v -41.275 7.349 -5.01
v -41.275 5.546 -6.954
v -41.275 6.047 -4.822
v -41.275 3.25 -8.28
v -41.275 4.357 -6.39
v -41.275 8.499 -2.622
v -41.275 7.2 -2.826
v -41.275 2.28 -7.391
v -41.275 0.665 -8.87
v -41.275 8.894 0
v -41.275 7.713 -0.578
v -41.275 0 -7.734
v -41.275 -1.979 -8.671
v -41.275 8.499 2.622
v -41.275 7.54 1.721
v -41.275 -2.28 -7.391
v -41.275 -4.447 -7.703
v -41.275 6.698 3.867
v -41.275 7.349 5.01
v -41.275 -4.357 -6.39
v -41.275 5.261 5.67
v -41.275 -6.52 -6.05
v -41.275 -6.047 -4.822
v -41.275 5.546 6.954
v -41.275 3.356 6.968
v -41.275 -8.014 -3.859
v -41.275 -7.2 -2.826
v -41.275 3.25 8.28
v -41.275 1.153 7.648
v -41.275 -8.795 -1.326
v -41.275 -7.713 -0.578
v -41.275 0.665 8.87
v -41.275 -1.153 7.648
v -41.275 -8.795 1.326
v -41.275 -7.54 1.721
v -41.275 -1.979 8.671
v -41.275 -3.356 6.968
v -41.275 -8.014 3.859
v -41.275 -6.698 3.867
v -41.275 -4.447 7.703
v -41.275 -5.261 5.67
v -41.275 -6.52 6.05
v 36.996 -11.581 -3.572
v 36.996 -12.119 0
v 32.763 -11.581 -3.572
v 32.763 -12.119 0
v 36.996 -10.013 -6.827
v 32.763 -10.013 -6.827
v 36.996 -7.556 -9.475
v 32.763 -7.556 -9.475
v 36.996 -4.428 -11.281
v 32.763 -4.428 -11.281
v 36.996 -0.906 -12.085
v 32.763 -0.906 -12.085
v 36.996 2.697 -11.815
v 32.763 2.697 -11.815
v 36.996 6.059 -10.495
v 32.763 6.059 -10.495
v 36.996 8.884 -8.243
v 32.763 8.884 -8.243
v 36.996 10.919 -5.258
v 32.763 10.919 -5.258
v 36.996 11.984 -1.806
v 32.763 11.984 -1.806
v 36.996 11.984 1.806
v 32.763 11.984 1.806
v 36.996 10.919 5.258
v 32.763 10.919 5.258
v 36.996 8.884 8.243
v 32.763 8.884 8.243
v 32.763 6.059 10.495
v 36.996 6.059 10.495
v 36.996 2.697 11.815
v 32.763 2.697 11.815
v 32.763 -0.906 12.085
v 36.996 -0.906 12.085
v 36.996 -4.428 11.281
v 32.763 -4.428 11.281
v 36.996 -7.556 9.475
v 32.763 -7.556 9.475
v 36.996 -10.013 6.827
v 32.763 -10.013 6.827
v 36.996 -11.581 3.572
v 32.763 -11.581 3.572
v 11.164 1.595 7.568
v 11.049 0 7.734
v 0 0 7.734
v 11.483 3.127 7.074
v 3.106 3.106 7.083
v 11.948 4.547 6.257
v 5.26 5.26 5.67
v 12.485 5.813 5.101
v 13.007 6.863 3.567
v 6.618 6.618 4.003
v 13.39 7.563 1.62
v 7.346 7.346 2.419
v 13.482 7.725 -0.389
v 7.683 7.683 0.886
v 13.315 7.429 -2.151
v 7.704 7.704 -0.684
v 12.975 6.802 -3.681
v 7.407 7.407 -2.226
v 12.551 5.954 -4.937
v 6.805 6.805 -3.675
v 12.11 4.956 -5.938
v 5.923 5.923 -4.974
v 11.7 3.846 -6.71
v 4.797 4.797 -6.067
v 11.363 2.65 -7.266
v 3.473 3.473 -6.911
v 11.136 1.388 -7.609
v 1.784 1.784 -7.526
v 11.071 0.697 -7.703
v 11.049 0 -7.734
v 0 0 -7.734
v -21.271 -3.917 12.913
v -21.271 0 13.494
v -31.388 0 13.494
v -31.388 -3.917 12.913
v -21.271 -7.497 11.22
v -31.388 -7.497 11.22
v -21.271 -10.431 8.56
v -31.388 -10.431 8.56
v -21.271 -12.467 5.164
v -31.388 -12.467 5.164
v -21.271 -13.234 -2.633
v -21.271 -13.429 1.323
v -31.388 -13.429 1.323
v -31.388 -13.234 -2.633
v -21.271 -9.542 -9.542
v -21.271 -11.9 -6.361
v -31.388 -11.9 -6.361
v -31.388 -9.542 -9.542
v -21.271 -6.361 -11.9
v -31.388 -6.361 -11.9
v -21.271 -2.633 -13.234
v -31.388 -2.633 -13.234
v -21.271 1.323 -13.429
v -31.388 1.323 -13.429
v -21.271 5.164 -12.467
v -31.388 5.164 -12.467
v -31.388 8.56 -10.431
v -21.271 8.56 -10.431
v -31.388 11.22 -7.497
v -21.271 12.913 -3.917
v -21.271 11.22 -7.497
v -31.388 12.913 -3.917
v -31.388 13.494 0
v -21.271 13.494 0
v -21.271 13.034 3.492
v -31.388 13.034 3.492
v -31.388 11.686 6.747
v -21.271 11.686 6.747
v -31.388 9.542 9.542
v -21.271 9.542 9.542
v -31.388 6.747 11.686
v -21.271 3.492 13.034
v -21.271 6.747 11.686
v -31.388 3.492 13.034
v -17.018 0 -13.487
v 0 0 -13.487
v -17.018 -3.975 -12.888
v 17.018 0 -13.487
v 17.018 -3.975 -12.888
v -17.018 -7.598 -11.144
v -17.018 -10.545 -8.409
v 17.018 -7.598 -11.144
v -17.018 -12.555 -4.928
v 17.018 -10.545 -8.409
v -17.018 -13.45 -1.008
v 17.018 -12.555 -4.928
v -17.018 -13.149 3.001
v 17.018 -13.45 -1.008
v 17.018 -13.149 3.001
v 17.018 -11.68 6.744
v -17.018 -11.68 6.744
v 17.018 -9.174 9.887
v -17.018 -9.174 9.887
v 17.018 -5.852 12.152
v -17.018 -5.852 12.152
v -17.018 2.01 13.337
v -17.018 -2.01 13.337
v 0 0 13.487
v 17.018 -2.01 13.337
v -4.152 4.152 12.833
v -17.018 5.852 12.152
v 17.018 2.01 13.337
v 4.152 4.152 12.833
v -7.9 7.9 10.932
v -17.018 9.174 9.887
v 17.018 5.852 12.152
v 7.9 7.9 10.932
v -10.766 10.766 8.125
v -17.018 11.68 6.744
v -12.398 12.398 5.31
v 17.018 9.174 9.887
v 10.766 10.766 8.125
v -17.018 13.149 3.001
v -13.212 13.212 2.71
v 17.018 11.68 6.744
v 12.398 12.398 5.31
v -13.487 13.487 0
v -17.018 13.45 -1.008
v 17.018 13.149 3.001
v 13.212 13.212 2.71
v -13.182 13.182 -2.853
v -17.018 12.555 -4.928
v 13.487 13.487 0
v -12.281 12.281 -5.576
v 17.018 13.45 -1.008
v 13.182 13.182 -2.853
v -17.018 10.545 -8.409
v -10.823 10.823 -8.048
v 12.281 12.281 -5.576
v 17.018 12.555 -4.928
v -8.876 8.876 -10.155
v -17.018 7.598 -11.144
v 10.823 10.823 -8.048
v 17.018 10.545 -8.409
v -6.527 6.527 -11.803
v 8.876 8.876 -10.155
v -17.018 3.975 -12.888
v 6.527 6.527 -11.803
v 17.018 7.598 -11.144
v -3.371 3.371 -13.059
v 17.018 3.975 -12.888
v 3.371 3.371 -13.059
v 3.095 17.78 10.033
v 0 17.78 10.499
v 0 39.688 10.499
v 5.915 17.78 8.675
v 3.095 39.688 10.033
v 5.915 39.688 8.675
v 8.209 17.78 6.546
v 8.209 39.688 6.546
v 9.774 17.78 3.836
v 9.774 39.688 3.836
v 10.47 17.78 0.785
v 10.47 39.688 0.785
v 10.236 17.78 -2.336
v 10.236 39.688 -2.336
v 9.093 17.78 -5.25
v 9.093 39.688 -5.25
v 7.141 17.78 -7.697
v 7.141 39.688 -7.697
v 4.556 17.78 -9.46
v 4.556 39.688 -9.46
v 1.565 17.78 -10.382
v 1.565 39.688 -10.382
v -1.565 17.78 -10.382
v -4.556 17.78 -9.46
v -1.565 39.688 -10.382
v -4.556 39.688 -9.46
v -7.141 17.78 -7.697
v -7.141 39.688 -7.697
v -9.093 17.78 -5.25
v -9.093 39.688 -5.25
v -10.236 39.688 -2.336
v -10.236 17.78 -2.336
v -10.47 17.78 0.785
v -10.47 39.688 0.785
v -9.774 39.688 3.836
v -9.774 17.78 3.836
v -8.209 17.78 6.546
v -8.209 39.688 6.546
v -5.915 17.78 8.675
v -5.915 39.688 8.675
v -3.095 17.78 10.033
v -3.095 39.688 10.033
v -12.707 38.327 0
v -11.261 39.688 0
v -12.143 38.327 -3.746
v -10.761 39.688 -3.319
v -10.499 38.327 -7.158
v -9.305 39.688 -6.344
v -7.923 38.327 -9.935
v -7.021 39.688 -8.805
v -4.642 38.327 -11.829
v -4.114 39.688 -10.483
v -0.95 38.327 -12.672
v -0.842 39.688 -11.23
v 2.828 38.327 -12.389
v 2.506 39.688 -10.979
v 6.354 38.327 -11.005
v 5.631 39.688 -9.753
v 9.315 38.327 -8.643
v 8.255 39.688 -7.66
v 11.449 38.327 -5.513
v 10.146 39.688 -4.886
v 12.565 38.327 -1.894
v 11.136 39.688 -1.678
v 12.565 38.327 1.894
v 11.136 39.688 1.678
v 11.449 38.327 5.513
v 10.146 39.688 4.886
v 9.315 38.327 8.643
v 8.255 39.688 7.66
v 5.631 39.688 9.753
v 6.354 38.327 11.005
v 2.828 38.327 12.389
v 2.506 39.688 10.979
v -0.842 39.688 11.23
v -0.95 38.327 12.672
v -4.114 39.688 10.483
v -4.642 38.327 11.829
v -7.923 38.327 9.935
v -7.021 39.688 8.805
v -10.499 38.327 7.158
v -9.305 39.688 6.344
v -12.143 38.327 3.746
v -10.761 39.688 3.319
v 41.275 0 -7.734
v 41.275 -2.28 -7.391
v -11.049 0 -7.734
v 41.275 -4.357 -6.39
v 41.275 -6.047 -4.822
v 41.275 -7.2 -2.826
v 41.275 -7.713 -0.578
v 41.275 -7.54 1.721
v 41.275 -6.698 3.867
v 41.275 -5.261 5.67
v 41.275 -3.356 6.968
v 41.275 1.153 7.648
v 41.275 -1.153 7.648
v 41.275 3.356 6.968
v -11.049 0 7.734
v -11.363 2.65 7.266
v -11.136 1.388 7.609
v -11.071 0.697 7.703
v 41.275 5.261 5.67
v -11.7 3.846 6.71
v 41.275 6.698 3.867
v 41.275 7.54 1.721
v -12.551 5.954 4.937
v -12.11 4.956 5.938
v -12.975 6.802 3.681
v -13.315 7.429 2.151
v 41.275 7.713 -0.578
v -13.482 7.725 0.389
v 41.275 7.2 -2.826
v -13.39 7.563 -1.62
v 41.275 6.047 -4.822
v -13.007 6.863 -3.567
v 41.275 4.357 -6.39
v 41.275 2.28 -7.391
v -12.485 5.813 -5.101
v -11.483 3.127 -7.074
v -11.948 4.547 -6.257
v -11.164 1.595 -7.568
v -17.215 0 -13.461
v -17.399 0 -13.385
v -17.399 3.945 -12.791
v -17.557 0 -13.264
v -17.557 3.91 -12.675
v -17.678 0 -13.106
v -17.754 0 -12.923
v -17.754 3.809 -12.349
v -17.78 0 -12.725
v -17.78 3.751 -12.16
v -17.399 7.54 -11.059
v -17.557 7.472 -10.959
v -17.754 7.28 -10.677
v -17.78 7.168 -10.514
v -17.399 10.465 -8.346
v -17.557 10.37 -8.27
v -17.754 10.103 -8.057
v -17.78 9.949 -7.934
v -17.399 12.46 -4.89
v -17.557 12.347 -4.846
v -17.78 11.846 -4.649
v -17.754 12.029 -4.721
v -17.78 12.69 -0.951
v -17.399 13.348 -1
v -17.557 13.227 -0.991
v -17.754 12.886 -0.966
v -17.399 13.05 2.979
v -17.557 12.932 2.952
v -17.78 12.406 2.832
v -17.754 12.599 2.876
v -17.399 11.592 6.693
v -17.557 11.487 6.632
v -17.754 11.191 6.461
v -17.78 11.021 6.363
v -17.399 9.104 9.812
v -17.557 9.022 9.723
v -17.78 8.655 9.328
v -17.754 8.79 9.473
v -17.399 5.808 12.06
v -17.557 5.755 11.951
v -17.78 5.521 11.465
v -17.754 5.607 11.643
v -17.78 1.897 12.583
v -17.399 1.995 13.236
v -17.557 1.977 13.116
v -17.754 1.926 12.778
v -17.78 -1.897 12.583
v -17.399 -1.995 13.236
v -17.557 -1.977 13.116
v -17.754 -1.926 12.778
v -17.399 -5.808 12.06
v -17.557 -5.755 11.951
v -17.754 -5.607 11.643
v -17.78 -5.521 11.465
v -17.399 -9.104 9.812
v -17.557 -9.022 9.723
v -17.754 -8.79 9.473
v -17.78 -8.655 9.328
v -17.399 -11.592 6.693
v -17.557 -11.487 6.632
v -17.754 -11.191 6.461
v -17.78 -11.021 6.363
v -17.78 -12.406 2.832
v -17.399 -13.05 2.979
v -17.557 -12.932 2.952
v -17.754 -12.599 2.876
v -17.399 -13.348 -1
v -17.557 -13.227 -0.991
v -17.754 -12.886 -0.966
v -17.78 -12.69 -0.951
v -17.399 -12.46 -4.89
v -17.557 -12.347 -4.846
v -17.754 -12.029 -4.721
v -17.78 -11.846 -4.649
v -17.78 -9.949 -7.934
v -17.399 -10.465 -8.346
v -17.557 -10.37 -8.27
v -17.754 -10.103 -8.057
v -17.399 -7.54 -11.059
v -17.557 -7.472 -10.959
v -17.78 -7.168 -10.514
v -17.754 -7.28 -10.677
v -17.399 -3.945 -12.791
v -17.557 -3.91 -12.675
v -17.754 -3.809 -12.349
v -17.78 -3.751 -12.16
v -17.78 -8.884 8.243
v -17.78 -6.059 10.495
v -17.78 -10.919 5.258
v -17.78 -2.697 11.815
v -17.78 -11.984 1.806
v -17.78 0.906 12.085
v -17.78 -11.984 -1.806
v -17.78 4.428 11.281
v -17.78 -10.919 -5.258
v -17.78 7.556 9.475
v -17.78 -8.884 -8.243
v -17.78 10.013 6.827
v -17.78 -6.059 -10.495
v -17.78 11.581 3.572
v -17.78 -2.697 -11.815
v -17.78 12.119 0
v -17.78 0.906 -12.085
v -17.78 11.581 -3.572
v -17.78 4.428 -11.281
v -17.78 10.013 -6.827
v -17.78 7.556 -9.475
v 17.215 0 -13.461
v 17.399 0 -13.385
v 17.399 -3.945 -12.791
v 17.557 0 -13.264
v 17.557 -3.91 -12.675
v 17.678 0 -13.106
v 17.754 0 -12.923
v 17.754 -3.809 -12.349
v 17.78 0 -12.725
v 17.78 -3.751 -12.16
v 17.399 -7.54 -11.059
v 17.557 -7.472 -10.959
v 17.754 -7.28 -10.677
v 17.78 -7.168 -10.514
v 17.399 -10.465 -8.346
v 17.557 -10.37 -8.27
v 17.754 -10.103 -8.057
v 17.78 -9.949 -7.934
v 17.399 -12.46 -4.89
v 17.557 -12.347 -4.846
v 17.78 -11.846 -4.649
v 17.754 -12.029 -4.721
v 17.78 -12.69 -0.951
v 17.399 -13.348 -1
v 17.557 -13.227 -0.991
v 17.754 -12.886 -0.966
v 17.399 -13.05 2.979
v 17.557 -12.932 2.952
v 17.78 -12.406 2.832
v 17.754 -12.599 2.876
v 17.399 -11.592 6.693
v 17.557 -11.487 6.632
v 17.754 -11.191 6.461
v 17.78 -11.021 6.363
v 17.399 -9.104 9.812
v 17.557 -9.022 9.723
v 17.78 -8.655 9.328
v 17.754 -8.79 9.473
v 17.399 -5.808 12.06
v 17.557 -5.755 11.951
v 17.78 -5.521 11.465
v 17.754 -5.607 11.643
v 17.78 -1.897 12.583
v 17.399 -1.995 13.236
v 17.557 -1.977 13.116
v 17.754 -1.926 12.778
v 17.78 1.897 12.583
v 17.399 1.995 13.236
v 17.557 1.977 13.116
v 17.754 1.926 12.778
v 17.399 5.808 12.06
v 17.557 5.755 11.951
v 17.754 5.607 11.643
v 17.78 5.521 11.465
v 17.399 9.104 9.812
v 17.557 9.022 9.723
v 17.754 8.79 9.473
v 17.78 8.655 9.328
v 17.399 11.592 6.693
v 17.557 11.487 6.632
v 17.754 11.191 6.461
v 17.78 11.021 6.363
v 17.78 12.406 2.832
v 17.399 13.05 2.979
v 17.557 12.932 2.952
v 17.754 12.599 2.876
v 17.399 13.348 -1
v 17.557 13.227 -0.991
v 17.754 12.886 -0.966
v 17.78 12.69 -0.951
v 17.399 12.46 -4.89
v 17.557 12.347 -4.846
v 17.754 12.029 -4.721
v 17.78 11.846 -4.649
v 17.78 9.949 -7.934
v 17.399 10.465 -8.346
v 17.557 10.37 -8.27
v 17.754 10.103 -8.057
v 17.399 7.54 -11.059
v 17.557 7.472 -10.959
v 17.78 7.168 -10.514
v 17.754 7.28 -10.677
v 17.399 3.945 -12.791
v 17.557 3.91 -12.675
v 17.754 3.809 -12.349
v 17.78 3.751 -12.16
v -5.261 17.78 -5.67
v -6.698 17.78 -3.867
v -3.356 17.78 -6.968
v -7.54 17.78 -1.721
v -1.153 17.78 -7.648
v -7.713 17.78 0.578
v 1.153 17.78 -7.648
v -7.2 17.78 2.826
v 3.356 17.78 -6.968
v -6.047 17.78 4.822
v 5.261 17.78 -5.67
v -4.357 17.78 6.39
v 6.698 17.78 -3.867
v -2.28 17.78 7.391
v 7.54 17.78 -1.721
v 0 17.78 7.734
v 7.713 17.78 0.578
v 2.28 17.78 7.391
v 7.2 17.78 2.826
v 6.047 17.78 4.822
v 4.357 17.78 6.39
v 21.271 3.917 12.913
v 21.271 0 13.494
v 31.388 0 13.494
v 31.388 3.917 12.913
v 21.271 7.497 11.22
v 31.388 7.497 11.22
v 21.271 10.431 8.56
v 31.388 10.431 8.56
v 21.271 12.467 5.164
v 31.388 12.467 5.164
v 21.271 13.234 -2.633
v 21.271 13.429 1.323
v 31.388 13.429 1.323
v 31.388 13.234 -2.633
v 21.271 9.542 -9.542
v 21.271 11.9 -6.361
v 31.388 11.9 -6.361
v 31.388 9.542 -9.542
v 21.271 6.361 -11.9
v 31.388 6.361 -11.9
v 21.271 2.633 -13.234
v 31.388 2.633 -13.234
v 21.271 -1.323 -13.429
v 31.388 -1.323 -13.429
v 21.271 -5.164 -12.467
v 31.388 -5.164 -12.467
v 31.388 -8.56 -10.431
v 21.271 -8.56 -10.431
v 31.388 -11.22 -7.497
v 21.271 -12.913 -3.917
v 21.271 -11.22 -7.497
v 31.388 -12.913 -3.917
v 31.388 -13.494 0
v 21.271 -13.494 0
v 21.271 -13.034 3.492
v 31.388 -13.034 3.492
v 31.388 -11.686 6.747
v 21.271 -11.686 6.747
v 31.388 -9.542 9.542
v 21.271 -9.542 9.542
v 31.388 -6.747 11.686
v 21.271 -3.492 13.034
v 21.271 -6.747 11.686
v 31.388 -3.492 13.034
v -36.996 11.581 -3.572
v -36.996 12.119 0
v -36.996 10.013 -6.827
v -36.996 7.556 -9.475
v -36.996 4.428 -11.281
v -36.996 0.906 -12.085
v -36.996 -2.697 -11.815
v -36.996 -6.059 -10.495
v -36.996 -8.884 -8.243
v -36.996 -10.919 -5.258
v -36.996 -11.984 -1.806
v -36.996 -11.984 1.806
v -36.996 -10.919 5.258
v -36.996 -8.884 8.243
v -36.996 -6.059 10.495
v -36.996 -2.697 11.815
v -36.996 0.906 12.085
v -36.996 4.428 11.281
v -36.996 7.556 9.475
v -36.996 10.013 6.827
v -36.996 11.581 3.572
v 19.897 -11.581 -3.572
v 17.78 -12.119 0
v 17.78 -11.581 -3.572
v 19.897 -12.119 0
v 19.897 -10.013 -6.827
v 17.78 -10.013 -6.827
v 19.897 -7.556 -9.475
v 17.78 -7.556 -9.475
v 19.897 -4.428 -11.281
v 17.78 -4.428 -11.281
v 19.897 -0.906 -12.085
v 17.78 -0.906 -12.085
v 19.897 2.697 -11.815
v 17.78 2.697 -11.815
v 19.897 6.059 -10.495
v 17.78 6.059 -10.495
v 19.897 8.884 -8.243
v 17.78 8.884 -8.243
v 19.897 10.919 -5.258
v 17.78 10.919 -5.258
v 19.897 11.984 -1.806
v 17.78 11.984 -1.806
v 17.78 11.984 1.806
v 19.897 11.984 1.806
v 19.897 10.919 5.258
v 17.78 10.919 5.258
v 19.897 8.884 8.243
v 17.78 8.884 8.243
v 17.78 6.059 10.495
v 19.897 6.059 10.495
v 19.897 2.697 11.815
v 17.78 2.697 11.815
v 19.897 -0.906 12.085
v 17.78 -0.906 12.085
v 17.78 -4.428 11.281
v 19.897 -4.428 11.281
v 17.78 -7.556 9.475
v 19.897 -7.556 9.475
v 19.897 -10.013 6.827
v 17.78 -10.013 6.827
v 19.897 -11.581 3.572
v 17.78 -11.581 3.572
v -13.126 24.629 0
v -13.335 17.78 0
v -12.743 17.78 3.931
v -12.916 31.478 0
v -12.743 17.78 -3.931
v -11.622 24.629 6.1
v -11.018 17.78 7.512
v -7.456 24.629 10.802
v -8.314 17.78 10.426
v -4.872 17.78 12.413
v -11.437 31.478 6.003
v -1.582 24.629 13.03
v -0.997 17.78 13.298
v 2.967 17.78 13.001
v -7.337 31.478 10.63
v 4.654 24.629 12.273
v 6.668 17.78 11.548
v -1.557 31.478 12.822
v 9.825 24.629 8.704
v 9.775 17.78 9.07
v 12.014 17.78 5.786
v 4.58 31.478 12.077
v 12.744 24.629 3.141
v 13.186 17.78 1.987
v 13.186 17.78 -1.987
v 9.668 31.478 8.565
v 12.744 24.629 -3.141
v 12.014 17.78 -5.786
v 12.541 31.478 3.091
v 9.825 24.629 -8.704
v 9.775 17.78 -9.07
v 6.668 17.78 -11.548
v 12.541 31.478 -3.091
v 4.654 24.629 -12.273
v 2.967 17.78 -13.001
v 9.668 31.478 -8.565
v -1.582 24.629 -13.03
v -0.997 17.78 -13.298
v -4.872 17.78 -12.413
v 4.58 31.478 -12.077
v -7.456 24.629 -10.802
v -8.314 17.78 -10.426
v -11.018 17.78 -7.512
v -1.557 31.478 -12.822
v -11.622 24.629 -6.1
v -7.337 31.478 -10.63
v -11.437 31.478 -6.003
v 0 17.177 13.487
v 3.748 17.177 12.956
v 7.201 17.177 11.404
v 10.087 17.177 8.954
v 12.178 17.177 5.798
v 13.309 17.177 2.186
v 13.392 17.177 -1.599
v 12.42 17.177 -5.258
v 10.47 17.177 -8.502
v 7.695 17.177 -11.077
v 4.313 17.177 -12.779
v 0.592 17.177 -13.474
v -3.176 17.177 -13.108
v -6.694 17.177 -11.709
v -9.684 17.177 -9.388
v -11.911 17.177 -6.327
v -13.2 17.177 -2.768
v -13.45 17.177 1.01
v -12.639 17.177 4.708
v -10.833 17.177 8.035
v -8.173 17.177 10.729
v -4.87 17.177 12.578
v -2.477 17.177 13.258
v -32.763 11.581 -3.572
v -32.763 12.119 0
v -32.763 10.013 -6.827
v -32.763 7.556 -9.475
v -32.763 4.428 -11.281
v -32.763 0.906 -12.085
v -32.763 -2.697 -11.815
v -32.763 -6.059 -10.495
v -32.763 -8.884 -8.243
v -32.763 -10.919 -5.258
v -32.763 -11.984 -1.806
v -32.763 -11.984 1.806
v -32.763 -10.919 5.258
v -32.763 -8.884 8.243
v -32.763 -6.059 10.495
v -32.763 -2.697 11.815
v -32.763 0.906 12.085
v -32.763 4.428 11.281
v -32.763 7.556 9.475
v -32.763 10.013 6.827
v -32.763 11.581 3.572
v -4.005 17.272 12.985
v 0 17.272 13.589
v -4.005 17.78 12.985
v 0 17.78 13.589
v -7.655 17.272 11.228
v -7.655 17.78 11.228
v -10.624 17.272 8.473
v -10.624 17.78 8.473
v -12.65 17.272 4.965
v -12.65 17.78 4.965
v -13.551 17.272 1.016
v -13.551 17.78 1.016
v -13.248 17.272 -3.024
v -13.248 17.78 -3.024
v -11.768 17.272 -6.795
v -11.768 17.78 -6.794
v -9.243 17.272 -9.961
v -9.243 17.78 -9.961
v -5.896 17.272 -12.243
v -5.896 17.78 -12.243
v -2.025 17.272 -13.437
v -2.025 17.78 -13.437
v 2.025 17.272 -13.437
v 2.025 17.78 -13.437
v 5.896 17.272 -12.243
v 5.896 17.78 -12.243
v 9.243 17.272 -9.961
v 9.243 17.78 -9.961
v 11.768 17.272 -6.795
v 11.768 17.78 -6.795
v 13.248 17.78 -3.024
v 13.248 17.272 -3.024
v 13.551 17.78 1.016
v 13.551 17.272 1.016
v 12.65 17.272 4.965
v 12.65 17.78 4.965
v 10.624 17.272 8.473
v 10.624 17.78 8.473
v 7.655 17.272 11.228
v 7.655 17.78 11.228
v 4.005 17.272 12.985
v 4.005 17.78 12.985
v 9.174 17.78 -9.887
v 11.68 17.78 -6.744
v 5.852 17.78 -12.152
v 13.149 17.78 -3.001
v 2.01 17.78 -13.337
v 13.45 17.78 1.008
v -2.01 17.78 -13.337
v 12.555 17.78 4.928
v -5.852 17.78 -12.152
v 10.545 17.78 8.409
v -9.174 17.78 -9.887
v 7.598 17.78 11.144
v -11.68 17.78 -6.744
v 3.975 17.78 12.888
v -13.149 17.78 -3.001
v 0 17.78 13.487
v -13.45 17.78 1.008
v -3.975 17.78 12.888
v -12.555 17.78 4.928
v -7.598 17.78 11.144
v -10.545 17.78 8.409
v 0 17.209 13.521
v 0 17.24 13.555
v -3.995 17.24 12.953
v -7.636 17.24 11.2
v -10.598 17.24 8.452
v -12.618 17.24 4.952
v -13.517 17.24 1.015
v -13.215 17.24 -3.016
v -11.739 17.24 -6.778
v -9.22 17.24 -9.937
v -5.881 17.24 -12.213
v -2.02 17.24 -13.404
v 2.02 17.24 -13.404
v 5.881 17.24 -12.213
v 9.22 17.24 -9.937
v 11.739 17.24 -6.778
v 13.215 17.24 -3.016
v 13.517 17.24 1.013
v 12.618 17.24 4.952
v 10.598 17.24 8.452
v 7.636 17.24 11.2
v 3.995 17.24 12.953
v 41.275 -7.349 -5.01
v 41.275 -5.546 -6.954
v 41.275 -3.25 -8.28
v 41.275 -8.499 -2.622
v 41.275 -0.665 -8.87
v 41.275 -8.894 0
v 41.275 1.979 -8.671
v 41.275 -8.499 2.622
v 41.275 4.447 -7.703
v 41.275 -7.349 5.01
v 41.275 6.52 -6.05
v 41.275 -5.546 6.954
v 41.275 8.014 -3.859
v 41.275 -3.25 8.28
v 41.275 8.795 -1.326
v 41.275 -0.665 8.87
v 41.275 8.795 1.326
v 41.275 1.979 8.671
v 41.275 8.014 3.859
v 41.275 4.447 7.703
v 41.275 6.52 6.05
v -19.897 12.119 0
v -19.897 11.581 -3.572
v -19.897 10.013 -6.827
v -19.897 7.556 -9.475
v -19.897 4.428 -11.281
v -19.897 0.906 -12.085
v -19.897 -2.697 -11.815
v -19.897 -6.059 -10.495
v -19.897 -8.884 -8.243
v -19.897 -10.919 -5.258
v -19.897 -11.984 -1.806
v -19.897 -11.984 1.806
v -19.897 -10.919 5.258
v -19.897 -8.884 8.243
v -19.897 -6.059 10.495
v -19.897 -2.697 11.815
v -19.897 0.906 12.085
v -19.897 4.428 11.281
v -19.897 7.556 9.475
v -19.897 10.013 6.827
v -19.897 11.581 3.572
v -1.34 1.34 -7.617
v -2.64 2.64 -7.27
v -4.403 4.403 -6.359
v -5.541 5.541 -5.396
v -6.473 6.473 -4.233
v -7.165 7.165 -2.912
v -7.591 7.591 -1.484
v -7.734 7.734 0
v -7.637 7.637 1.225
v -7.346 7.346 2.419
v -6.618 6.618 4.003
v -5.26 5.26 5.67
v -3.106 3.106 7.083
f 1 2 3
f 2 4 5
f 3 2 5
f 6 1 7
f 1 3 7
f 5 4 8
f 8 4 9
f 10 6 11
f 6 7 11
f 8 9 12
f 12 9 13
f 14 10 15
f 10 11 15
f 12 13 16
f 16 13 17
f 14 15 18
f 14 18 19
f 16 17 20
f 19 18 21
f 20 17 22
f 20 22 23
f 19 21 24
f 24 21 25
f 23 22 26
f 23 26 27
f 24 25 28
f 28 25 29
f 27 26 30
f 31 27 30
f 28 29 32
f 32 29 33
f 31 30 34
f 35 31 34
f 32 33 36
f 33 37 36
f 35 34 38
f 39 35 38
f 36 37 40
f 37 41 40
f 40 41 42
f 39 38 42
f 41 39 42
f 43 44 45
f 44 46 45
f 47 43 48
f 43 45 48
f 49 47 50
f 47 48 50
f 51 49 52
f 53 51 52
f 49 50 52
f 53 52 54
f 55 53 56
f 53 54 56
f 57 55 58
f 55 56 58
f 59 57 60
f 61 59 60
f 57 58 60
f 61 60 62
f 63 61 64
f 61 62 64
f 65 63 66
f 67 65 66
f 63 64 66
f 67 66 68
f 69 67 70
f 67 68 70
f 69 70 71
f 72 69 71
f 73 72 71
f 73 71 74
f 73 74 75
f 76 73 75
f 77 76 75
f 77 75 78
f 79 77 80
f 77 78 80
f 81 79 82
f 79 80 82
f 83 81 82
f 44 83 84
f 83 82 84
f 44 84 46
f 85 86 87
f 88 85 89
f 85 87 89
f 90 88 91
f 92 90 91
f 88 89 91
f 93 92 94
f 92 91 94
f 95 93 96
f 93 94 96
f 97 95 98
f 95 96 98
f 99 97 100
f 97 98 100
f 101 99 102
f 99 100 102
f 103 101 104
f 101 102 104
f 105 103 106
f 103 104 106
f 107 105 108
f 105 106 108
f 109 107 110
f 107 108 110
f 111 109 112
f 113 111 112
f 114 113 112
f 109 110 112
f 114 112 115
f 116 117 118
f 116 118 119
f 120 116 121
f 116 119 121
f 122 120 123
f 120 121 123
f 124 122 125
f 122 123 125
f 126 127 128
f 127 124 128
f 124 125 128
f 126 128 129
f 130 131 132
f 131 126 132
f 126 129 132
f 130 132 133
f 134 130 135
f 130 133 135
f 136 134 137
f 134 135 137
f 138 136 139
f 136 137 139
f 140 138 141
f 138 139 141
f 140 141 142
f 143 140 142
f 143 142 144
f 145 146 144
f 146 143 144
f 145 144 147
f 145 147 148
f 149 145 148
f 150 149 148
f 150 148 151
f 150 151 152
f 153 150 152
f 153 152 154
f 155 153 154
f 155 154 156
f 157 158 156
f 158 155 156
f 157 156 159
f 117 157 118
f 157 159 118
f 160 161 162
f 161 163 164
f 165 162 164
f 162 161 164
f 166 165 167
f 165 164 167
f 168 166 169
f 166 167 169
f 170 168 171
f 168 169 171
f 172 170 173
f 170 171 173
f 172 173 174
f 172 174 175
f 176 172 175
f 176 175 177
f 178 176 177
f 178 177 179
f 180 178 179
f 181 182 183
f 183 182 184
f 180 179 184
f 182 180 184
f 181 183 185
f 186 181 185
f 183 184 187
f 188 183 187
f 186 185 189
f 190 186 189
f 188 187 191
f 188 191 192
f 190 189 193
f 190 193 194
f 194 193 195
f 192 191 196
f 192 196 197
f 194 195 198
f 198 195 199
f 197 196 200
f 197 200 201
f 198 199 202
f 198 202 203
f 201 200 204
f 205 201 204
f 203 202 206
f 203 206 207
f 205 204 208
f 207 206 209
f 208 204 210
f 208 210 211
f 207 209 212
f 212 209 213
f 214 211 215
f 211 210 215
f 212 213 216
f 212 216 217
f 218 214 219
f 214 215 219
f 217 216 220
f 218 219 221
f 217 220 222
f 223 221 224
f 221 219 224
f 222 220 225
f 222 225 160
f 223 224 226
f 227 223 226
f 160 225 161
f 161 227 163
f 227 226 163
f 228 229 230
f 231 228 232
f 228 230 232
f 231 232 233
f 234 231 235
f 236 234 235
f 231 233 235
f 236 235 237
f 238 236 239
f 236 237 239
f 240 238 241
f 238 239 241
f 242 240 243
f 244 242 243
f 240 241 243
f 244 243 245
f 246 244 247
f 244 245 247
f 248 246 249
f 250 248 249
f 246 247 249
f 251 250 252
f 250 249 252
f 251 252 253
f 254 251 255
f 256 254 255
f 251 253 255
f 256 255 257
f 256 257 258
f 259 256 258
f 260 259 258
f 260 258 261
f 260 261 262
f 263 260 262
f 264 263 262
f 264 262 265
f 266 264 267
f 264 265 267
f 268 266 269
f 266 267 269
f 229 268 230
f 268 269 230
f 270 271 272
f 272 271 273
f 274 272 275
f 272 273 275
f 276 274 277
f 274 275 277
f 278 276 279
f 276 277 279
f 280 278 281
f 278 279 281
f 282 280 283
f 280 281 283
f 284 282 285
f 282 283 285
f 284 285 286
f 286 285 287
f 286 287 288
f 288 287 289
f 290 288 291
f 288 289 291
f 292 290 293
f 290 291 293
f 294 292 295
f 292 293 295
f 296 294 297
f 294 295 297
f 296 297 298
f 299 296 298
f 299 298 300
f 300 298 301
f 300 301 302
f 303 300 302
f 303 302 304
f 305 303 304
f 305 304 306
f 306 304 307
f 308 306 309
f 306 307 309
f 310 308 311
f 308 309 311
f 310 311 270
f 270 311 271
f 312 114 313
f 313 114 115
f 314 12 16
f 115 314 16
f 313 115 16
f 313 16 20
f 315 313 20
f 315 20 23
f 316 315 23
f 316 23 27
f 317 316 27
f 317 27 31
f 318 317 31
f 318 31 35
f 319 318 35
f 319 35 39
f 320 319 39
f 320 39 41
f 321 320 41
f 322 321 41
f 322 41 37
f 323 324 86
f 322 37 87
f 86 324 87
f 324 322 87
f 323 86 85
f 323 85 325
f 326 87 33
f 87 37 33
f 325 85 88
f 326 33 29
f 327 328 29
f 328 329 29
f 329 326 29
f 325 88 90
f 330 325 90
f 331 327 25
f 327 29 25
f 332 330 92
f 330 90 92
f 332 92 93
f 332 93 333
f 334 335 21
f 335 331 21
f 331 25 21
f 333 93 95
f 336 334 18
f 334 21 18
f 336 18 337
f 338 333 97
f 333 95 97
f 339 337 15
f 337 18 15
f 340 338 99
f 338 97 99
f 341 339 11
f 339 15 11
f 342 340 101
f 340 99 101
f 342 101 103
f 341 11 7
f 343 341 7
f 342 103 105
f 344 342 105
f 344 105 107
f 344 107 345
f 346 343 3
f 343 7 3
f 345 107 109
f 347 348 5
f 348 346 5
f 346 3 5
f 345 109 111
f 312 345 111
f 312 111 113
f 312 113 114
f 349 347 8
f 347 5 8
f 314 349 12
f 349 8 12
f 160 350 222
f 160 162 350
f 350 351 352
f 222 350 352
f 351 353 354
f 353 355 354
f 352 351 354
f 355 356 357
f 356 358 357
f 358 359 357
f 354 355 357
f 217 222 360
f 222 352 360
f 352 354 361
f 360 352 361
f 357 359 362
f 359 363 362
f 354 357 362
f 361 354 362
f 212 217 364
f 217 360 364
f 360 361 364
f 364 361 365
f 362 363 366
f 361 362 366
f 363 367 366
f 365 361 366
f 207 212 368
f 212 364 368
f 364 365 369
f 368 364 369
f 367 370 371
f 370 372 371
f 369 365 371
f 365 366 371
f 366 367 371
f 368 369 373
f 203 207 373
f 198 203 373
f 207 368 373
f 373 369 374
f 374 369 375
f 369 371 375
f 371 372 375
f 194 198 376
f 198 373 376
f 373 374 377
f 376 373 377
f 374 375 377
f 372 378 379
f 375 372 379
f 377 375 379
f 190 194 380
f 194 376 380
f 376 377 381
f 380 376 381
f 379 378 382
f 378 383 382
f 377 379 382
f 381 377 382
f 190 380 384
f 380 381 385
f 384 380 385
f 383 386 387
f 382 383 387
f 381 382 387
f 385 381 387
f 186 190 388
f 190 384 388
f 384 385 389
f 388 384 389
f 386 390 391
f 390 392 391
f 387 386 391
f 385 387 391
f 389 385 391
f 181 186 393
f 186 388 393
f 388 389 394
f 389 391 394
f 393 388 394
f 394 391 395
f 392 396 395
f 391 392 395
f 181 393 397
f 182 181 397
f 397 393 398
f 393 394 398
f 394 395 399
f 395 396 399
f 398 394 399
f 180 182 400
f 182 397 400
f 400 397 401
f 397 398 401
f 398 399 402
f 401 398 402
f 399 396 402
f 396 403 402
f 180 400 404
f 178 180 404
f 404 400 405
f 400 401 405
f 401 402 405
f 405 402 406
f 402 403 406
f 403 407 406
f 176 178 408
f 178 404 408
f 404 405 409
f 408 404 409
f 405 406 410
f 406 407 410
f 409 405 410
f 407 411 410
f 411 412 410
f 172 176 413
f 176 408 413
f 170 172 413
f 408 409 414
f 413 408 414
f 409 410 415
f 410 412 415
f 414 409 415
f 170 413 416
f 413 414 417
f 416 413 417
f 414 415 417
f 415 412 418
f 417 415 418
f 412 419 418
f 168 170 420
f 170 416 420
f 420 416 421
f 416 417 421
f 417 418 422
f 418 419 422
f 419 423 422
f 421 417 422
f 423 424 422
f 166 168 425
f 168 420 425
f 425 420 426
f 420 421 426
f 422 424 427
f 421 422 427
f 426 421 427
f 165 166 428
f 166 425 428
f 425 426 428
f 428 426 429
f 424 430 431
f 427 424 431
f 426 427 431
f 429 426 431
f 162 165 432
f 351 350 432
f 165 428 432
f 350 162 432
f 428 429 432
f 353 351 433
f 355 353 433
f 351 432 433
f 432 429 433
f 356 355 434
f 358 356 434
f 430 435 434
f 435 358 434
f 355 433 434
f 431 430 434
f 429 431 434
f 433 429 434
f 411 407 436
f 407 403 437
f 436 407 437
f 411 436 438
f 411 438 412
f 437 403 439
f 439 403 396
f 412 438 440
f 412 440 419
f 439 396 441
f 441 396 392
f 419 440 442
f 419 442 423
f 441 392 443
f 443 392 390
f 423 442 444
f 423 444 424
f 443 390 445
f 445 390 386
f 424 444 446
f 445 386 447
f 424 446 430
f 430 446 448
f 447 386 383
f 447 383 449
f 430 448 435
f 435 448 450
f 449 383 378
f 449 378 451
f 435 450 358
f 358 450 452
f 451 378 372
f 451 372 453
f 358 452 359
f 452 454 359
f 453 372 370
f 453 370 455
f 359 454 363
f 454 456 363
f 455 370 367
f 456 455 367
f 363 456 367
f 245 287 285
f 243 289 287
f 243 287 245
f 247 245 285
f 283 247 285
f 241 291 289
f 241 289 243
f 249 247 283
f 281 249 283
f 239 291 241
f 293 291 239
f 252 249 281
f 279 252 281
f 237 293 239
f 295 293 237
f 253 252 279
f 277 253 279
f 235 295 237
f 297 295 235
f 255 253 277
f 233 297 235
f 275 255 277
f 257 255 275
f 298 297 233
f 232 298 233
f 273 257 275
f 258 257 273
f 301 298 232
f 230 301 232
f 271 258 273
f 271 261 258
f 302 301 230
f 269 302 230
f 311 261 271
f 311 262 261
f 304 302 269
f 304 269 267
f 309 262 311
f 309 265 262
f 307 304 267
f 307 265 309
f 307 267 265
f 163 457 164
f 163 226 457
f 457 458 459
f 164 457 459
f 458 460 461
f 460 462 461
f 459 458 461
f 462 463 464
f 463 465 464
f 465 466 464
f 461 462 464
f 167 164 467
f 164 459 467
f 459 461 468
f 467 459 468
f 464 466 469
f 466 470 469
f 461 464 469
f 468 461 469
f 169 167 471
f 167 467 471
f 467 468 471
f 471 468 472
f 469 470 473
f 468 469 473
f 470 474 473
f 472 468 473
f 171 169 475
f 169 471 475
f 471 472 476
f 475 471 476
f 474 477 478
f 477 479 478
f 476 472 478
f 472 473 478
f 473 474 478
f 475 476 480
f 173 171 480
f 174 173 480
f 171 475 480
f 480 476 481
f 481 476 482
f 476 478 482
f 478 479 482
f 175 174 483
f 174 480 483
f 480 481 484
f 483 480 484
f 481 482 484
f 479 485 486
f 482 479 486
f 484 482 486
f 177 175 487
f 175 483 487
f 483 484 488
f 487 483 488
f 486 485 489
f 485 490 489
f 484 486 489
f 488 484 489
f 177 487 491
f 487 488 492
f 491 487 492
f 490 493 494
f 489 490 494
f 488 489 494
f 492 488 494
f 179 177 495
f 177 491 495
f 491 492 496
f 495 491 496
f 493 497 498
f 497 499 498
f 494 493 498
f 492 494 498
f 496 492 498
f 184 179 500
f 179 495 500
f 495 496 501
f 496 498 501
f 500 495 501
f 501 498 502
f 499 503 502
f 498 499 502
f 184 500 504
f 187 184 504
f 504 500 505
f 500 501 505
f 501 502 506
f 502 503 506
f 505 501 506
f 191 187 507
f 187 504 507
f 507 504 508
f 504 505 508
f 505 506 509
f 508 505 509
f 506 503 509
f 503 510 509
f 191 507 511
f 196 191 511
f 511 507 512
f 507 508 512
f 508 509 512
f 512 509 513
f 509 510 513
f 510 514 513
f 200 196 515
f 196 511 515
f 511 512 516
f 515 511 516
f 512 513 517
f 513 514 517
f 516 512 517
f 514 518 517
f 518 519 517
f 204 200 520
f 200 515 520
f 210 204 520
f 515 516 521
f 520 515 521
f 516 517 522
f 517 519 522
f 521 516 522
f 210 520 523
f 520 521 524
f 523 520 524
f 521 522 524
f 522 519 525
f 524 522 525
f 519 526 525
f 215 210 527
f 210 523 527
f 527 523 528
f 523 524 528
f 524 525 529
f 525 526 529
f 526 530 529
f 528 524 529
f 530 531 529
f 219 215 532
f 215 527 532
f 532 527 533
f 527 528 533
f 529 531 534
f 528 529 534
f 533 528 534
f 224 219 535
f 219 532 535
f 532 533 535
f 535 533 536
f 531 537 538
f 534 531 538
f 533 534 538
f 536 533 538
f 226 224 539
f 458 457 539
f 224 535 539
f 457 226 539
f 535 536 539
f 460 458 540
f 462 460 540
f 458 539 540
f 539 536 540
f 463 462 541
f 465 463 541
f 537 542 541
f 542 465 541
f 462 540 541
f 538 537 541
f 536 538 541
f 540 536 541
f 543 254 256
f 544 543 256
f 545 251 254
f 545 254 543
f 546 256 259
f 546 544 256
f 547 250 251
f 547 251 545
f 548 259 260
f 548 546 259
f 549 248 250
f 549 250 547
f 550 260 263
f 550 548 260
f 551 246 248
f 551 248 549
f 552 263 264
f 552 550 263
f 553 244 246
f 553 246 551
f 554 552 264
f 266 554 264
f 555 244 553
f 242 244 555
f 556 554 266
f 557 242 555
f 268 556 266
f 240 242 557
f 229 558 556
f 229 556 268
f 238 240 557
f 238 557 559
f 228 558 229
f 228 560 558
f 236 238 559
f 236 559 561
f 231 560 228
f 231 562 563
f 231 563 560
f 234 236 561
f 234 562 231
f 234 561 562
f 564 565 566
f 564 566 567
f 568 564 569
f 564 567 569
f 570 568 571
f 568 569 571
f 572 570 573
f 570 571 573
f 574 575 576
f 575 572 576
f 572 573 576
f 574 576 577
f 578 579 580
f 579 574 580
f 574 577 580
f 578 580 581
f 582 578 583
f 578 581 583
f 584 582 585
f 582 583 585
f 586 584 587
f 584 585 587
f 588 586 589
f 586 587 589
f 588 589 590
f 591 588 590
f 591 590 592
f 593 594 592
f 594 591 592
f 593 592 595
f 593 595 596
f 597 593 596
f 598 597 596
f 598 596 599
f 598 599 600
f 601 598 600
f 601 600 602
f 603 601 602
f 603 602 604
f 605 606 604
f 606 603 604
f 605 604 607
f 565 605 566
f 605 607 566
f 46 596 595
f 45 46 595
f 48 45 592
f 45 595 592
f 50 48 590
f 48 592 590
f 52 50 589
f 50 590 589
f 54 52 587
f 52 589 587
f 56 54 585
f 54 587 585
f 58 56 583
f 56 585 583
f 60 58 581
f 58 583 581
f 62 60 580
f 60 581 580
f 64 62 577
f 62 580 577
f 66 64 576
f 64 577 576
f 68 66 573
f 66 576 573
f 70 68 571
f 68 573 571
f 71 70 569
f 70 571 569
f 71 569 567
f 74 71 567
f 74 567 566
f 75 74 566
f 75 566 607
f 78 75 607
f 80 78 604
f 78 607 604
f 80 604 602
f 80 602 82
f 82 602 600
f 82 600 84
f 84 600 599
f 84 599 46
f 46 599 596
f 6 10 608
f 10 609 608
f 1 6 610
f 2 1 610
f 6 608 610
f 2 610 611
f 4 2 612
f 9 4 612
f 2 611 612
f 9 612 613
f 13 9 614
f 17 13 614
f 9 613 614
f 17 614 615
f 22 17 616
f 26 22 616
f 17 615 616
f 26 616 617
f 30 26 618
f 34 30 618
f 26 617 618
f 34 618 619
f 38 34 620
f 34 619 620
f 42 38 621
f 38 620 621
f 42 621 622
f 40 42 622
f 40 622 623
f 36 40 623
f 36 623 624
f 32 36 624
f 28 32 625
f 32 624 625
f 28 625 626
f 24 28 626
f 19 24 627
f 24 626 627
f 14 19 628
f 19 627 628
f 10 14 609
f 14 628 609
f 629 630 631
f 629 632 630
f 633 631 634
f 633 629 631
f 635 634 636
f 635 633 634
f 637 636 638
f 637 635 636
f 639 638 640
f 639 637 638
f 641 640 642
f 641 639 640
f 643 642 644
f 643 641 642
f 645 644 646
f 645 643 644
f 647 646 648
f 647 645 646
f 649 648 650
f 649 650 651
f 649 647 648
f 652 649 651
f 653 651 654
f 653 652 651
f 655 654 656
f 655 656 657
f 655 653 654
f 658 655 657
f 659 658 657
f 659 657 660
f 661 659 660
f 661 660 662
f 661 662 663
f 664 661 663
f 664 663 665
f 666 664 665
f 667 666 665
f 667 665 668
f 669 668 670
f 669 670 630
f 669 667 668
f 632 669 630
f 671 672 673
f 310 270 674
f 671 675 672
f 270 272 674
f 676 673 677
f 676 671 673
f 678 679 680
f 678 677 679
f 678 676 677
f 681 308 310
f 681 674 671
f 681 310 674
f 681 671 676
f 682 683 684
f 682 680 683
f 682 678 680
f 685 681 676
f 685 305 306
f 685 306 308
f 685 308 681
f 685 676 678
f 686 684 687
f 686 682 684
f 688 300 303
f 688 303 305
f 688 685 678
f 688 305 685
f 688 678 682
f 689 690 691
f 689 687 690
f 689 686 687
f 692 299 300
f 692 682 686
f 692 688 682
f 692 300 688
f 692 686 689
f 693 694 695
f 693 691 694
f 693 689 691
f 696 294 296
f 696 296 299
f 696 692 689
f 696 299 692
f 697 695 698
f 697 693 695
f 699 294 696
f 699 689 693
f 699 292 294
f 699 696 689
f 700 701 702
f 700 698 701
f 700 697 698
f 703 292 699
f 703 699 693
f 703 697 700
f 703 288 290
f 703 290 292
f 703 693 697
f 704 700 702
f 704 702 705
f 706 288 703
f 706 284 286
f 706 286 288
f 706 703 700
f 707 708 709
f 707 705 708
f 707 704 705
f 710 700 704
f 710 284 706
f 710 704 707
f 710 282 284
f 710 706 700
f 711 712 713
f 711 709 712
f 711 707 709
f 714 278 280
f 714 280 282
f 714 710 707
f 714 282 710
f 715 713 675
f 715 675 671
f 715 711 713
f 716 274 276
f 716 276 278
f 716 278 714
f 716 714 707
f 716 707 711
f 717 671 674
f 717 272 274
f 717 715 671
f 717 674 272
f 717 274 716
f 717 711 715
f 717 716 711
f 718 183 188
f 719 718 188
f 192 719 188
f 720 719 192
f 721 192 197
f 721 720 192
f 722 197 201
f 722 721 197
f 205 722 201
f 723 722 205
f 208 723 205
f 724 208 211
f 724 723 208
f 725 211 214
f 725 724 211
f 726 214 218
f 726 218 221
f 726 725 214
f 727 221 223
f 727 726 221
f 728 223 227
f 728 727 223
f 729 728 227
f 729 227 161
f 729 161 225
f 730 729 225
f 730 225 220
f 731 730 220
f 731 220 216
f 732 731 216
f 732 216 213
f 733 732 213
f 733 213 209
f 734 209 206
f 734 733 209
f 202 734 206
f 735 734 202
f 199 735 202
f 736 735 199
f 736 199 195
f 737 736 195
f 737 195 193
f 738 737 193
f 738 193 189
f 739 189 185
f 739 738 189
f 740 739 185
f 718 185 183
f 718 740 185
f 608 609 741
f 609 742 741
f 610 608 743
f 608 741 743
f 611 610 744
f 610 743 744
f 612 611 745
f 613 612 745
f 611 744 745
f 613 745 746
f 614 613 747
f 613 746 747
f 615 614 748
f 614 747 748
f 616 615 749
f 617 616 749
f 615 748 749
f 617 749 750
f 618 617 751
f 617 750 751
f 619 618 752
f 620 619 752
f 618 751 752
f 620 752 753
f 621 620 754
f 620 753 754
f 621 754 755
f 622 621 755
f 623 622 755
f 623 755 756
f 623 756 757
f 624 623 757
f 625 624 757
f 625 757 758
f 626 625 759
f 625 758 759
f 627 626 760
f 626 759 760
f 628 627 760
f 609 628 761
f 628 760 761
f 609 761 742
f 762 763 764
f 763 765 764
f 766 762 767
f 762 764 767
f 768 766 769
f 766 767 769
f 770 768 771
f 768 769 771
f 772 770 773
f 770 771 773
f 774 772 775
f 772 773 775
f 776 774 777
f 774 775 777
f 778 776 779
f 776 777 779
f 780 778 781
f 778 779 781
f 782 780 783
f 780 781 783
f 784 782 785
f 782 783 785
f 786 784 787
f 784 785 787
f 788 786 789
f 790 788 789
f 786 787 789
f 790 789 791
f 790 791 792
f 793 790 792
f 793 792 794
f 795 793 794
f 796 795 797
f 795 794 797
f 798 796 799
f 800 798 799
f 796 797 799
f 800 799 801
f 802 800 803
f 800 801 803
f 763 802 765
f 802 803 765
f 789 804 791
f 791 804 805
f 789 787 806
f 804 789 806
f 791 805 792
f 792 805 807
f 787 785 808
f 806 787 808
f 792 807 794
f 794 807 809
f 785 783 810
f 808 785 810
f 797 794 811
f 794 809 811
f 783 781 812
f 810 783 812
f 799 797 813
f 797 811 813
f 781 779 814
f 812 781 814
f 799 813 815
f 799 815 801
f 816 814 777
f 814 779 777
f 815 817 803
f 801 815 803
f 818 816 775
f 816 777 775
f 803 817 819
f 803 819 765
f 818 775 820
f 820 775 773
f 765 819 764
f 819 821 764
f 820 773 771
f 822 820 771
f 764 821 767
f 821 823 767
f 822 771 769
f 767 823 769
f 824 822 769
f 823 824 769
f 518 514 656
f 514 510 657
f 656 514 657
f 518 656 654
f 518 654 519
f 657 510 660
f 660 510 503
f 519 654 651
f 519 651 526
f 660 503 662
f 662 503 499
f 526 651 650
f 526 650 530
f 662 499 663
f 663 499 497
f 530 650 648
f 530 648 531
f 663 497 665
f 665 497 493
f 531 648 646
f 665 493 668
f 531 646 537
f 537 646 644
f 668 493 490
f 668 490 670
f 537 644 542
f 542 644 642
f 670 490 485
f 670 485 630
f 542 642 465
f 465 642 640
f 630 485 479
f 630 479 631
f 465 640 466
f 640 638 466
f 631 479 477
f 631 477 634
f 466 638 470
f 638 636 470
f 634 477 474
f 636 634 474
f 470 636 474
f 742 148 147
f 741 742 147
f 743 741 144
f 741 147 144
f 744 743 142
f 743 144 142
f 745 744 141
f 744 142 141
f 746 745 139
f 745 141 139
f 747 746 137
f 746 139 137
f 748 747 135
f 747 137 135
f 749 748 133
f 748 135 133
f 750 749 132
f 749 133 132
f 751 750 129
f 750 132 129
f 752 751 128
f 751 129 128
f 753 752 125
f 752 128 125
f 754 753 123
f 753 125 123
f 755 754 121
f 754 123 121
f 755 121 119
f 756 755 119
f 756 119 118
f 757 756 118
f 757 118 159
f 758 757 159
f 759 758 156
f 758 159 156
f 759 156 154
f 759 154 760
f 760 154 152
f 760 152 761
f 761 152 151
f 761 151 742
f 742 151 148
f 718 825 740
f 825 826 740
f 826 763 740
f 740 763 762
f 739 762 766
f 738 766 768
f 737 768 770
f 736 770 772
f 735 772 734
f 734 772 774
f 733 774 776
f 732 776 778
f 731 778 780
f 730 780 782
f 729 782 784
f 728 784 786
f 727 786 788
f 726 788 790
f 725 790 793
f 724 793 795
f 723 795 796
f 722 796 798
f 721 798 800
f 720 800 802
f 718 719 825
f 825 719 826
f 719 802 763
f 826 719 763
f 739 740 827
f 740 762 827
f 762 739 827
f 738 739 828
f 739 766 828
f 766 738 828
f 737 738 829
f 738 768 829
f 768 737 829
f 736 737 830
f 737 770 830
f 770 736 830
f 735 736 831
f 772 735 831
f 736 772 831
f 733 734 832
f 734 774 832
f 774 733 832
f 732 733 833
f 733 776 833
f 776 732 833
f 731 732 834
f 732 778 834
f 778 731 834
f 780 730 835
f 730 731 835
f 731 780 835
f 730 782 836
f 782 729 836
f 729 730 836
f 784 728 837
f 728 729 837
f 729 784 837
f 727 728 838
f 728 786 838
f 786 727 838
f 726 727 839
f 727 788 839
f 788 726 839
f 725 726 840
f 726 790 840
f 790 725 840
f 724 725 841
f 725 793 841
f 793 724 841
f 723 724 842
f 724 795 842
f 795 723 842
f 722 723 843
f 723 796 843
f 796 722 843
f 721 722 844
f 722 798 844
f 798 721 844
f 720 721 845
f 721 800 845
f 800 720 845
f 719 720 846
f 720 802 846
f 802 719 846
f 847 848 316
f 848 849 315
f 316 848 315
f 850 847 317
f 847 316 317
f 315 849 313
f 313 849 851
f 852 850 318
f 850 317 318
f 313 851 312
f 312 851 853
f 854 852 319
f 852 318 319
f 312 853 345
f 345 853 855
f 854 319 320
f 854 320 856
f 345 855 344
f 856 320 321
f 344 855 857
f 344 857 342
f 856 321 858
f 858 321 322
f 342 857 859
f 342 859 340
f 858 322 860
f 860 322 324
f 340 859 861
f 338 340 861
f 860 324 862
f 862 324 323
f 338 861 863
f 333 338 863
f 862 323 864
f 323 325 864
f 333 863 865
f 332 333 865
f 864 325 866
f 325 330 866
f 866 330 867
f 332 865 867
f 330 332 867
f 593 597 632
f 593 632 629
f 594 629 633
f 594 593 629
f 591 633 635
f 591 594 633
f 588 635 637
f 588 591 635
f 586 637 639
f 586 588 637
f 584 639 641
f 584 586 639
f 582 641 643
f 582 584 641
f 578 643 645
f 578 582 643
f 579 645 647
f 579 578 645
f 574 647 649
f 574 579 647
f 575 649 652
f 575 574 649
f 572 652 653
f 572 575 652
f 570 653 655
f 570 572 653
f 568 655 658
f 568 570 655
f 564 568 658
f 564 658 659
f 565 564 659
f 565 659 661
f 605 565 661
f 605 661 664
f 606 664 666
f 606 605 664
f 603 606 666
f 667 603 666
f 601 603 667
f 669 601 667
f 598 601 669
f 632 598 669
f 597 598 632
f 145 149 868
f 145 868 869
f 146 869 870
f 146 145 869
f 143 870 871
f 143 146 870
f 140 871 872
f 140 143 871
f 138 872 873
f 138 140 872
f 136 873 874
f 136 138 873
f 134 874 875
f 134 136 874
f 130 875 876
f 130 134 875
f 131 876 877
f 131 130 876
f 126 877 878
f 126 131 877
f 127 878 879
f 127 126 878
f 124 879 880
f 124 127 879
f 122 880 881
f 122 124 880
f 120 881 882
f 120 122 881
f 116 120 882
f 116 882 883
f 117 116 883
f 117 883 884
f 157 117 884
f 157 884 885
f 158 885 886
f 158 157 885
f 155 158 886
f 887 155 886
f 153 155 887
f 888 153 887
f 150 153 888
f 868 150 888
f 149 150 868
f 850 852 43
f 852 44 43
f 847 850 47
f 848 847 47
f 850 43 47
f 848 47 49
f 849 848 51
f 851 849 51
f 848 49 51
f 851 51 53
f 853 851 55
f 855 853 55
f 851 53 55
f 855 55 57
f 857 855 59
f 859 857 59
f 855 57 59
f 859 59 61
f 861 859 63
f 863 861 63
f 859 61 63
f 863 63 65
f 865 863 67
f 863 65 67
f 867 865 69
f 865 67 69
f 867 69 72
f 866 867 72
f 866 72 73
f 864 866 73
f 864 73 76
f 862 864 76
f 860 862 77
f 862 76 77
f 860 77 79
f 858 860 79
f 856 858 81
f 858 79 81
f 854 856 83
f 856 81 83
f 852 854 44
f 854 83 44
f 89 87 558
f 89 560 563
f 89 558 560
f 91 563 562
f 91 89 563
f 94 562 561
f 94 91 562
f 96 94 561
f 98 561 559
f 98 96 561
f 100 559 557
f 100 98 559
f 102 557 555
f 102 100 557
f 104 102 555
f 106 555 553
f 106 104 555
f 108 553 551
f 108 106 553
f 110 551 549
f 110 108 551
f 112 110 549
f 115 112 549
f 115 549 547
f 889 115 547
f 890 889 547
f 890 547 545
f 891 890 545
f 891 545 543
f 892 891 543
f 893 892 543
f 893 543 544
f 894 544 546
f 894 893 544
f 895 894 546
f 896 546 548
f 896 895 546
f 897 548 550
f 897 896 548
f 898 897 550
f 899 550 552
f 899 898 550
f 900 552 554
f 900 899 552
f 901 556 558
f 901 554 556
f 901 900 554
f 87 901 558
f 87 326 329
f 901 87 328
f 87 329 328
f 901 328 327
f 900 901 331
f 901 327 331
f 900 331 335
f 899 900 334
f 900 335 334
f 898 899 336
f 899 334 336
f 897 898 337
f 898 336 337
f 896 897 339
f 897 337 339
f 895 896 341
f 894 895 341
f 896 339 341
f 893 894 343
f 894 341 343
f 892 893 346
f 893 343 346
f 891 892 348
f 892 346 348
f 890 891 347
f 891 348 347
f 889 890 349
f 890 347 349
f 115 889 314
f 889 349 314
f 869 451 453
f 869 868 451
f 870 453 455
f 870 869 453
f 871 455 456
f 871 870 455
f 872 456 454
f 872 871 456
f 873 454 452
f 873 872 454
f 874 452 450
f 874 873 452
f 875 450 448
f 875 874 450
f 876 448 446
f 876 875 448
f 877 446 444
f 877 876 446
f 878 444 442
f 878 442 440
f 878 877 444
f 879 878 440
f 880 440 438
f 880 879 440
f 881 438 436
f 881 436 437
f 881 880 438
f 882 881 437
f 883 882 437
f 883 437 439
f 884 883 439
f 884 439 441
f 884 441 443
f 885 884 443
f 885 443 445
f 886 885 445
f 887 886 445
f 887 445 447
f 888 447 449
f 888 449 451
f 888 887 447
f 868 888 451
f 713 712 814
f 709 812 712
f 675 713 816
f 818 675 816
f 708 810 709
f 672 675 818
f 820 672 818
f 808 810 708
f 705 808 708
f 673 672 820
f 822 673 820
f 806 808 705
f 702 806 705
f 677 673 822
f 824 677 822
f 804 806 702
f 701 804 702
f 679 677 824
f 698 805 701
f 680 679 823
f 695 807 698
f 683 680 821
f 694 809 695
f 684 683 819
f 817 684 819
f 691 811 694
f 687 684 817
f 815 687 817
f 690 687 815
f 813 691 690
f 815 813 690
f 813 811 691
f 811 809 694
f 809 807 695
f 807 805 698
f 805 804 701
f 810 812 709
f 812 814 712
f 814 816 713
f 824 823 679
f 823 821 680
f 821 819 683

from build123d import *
from build123d.topology import SkipClean

# Parameters (mm, degrees)
SKETCH2_R           = 13.49375
EXTRUDE1_DEPTH      = 23.495
SKETCH15_R          = 13.4874
BOSS_EXTRUDE1_DEPTH = 17.78
SKETCH16_R          = 7.7343
CUT_EXTRUDE1_DEPTH  = 46.47293924
SKETCH20_R          = 13.4874
BOSS_EXTRUDE2_DEPTH = 17.78
SKETCH22_R          = 13.335
BOSS_EXTRUDE3_DEPTH = 21.9075
BOSS_EXTRUDE3_TAPER = 1.75
CHAMFER1_SIZE       = 1.360714286
CHAMFER1_SIZE_2     = 1.404253042
SKETCH25_R          = 13.335
BOSS_EXTRUDE4_DEPTH = 21.9075
BOSS_EXTRUDE4_DRAFT = -15
SKETCH28_R          = 10.499412296
CUT_EXTRUDE6_DEPTH  = 21.9075
FILLET1_R           = 0.762
CIRPATTERN1_COUNT   = 2
CIRPATTERN1_ANGLE   = 180
SKETCH26_R          = 7.7343
CUT_EXTRUDE4_DEPTH  = 93.597306097
SKETCH29_R          = 7.7343
CUT_EXTRUDE7_DEPTH  = 59.850524324


with BuildPart() as part:
    # Sketch2 → Extrude1 (new body)
    with BuildSketch(Plane(origin=(-41.275, 0, 0), x_dir=(0, 0, -1), z_dir=(1, 0, 0))):
        with Locations(Location((0, 0, 0), (0, 0, 180))):
            Circle(SKETCH2_R)
    extrude(amount=EXTRUDE1_DEPTH)

    # Sketch5 → Cut-Revolve1 (revolve, cut)
    with BuildSketch(Plane.XY):
        Polygon((-36.995957679, 12.118934671), (-32.762624346, 12.118934671), (-31.387809017, 13.49375), (-41.275, 13.49375), (-41.275, 8.894445), align=None)
        Polygon((-17.78, 12.118934671), (-19.896666667, 12.118934671), (-21.271481995, 13.49375), (-17.78, 13.49375), align=None)
    revolve(axis=Axis((0, 0, 0), (-1, 0, 0)), mode=Mode.SUBTRACT)

    # Sketch15 → Boss-Extrude1 (add)
    with BuildSketch(Plane(origin=(-17.78, 0, 0), x_dir=(0, 0, -1), z_dir=(1, 0, 0))):
        Circle(SKETCH15_R)
    extrude(amount=BOSS_EXTRUDE1_DEPTH)

    # Sketch16 → Cut-Extrude1 (cut, through all)
    with BuildSketch(Plane(origin=(0, 0, 0), x_dir=(0, 0, -1), z_dir=(1, 0, 0))):
        Circle(SKETCH16_R)
    extrude(amount=-CUT_EXTRUDE1_DEPTH, mode=Mode.SUBTRACT)

    # Fillet1
    fillet1_edges = [part.edges().sort_by_distance(p)[0] for p in [
        (-17.78, 0, 13.4874),
    ]]
    fillet(fillet1_edges, radius=FILLET1_R)


with BuildPart() as body_2:
    # Sketch20 → Boss-Extrude2 (new body)
    with BuildSketch(Plane(origin=(0, 17.78, 0), x_dir=(-1, 0, 0), z_dir=(0, 1, 0))):
        with Locations(Location((0, 0, 0), (0, 0, 90))):
            Circle(SKETCH20_R)
    extrude(amount=-BOSS_EXTRUDE2_DEPTH)


with BuildPart() as body_3:
    # Sketch22 → Boss-Extrude3 (new body)
    with BuildSketch(Plane(origin=(0, 17.78, 0), x_dir=(-1, 0, 0), z_dir=(0, 1, 0))):
        Circle(SKETCH22_R)
    extrude(amount=BOSS_EXTRUDE3_DEPTH, taper=BOSS_EXTRUDE3_TAPER)

    # Chamfer1
    # the kernel refuses this chamfer: 1.404253042, 1.360714286 mm, written as the material it takes off along each edge
    with BuildSketch(Plane(origin=(0, 39.6875, 0), x_dir=(-1, 0, 0), z_dir=(0, 0, 1))) as chamfer1_piece_1:
        Polygon((12.665665338 + CHAMFER1_SIZE * 0.0305385132034, CHAMFER1_SIZE * 0.999533590627), (12.665665338 - CHAMFER1_SIZE_2, 0), (12.665665338, 0), align=None)
    revolve(axis=Axis((0, 39.6875, 0), (0, -1, 0)), mode=Mode.SUBTRACT)


with BuildPart() as boss_extrude4_tool:
    # Sketch25 → Boss-Extrude4 (with draft: the straight prism first)
    with BuildSketch(Plane.XZ.offset(-17.78)):
        Circle(SKETCH25_R)
    extrude(amount=-BOSS_EXTRUDE4_DEPTH)
    # Boss-Extrude4: the draft: its side faces are tilted about the plane it starts from
    boss_extrude4_sides = [boss_extrude4_tool.faces().sort_by_distance(p)[0] for p in [
        (-13.335, 28.73375, 0),
    ]]
    draft(boss_extrude4_sides, Plane.XZ.offset(-17.78), BOSS_EXTRUDE4_DRAFT)


with BuildPart() as body_3_1:
    add(body_3.part)

    # Boss-Extrude4: add boss_extrude4_tool
    add(boss_extrude4_tool.part)

    # Sketch28 → Cut-Extrude6 (cut)
    with BuildSketch(Plane(origin=(0, 39.6875, 0), x_dir=(1, 0, 0), z_dir=(0, 1, 0))):
        with Locations(Location((0, 0, 0), (0, 0, 270))):
            Circle(SKETCH28_R)
    extrude(amount=-CUT_EXTRUDE6_DEPTH, mode=Mode.SUBTRACT)


with BuildPart() as cirpattern1_1:
    # CirPattern1: pattern copy
    add(part.part.rotate(Axis((0, 0, 12.651043997), (0, 0, -1)), 1 * CIRPATTERN1_ANGLE / (CIRPATTERN1_COUNT - 1)))


with BuildPart() as part_1:
    add(part.part)

    # Combine2: union body 3, body 2, CirPattern1_1
    add(body_3_1.part)
    add(body_2.part)
    add(cirpattern1_1.part)

    # Sketch30 → Revolve1 (revolve)
    with SkipClean():  # the faces are left unmerged after this step: merging them gives an invalid solid
        with BuildSketch(Plane.XY, mode=Mode.PRIVATE) as revolve1_sk:
            with BuildLine():
                Line((0, 17.78), (0, 8.89))
                ThreePointArc((0, 8.89), (-7.214370781, 12.4003004), (-13.589, 17.272))
                Line((-13.589, 17.272), (-13.589, 17.78))
                Line((-13.589, 17.78), (0, 17.78))
            make_face()
        revolve(revolve1_sk.sketch.rotate(Axis((0, 17.78, 0), (0, -1, 0)), 270), axis=Axis((0, 17.78, 0), (0, -1, 0)))

    # Sketch26 → Cut-Extrude4 (cut, through all)
    with SkipClean():  # the faces are left unmerged after this step: merging them gives an invalid solid
        with BuildSketch(Plane.ZY.offset(41.275)):
            with Locations(Location((0, 0, 0), (0, 0, 180))):
                Circle(SKETCH26_R)
        extrude(amount=-CUT_EXTRUDE4_DEPTH, mode=Mode.SUBTRACT)

    # Sketch29 → Cut-Extrude7 (cut, through all)
    with SkipClean():  # the faces are left unmerged after this step: merging them gives an invalid solid
        with BuildSketch(Plane(origin=(0, 0, 0), x_dir=(1, 0, 0), z_dir=(0, 1, 0))):
            with Locations(Location((0, 0, 0), (0, 0, 270))):
                Circle(SKETCH29_R)
        extrude(amount=CUT_EXTRUDE7_DEPTH, mode=Mode.SUBTRACT)


solid = part_1.part
